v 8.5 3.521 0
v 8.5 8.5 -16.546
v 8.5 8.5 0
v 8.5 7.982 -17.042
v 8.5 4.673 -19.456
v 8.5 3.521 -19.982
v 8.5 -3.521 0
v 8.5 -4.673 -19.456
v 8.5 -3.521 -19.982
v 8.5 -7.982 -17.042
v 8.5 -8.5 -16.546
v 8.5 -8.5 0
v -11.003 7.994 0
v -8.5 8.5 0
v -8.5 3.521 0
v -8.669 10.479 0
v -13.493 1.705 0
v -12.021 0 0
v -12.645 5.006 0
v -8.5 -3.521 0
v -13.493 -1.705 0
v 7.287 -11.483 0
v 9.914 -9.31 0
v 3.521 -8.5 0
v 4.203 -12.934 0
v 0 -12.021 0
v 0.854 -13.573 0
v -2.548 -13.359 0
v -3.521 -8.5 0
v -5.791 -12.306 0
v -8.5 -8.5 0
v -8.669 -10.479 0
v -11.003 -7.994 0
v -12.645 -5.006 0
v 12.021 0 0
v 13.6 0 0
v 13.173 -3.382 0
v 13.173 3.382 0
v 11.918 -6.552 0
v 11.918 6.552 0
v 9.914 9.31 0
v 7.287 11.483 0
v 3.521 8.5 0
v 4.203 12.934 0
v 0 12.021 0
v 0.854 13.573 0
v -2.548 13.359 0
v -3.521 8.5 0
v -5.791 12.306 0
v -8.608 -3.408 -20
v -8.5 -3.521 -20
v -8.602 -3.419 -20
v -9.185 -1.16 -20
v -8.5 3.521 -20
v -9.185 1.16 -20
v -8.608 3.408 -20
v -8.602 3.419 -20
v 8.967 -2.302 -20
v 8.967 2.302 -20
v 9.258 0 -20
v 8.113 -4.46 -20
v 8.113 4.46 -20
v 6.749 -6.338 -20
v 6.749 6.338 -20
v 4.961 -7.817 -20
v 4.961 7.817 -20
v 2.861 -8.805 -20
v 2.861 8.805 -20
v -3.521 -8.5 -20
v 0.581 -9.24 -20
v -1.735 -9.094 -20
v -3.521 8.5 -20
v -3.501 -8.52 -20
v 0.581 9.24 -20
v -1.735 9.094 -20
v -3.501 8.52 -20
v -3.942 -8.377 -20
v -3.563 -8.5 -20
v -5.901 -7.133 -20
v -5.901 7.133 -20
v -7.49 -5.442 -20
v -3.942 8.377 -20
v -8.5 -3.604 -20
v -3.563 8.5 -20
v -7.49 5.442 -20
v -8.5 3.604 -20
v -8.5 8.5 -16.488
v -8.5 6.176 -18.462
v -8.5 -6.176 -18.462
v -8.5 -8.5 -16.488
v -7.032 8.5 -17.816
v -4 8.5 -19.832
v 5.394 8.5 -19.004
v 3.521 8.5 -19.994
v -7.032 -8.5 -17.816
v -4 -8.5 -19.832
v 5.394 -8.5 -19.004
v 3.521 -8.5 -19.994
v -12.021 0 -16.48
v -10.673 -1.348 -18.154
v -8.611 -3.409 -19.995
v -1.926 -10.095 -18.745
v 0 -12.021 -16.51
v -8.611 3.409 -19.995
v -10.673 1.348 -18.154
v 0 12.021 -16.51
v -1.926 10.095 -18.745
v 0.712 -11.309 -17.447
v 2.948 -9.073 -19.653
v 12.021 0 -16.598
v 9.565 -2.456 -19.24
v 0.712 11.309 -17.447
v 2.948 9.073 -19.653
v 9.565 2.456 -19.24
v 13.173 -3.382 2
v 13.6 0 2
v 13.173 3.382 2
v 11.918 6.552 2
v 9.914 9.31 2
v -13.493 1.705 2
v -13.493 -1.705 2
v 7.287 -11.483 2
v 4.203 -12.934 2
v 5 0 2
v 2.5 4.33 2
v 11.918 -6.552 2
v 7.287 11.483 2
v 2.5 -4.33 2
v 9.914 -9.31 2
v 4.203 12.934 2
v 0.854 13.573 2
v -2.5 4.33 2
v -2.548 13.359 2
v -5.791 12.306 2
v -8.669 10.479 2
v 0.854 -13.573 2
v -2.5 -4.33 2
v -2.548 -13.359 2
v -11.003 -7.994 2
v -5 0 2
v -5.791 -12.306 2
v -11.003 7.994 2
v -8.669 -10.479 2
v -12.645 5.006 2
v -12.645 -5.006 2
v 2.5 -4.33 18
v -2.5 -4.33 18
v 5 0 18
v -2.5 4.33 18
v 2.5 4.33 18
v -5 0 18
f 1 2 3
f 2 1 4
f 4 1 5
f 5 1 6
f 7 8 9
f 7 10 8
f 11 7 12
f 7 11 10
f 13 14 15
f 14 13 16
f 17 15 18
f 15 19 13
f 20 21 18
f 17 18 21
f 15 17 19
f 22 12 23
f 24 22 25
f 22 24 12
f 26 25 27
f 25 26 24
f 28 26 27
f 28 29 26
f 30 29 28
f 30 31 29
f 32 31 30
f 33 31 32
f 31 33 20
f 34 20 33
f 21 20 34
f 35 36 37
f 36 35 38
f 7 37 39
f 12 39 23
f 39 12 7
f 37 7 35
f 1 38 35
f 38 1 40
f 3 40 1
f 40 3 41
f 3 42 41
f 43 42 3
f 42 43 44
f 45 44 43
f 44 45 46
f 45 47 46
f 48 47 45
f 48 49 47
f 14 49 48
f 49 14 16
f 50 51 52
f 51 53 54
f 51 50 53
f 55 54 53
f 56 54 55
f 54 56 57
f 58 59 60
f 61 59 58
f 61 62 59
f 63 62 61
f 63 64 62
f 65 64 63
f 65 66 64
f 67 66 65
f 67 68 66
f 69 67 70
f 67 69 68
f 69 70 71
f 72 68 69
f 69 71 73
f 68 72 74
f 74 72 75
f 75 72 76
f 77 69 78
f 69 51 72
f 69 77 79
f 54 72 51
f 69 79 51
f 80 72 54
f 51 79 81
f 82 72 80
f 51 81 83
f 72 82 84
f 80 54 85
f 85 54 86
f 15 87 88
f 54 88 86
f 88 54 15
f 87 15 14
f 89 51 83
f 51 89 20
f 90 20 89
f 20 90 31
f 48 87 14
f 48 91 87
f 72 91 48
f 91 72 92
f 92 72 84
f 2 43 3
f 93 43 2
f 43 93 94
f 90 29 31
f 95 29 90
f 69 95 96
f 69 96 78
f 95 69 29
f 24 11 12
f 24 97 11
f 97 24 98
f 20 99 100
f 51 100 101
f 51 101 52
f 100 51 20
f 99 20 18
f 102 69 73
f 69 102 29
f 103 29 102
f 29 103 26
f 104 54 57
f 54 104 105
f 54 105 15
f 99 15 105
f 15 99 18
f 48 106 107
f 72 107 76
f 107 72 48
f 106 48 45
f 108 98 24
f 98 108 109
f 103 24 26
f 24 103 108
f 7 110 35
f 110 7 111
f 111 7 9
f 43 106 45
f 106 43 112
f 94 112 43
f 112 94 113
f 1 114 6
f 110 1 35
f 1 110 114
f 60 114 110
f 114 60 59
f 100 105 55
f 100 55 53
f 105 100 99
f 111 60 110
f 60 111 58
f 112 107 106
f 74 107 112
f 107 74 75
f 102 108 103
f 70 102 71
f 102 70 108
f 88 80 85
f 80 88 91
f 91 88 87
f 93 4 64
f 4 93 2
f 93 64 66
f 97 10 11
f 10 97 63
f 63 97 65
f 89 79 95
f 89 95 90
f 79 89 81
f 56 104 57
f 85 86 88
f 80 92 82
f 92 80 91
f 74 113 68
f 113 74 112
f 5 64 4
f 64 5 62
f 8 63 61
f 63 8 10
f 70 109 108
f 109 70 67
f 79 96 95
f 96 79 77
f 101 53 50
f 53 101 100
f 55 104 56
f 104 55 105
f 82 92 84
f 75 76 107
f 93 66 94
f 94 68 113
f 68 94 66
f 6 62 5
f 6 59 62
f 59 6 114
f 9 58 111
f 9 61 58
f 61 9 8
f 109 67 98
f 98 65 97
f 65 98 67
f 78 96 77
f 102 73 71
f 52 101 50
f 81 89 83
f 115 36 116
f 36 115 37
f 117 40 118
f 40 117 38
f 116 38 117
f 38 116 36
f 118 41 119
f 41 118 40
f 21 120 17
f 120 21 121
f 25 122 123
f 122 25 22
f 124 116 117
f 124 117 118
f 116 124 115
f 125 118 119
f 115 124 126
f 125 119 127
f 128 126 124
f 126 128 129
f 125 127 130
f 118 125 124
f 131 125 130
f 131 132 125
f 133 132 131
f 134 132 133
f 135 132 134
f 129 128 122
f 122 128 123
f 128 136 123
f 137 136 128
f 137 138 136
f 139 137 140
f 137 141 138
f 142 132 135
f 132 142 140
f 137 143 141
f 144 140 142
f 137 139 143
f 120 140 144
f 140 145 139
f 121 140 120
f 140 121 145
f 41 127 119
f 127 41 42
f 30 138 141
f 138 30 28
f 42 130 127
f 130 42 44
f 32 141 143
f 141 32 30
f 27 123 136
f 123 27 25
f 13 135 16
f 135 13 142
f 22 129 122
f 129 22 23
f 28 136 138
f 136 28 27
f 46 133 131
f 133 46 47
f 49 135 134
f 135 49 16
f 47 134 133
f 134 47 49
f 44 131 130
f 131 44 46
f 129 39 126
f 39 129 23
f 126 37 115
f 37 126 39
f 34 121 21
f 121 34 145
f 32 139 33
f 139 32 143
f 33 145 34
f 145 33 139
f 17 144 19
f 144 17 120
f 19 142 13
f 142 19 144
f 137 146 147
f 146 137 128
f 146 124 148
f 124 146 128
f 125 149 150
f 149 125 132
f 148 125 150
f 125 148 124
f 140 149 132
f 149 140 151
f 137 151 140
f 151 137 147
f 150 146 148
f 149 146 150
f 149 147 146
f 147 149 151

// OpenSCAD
$fn = 25;

bit_depth = 20;
edge_length = 17;

bit_size = 10;

cylinder(h = 2, d = edge_length * 1.6);
translate([0, 0, 2])
cylinder(h = 16, d = cos(0.523599) * bit_size, $fn = 6);
intersection()
{
    translate([0, 0, - bit_depth / 2])
    {
        cube([edge_length, edge_length, bit_depth], center = true);
        rotate([0, 0, 45])
        cube([edge_length, edge_length, bit_depth], center = true);
    }
    translate([0, 0,- bit_depth*1.57])
    cylinder(h = bit_depth*1.57, d1 = 0, d2 = edge_length * 3);
}
